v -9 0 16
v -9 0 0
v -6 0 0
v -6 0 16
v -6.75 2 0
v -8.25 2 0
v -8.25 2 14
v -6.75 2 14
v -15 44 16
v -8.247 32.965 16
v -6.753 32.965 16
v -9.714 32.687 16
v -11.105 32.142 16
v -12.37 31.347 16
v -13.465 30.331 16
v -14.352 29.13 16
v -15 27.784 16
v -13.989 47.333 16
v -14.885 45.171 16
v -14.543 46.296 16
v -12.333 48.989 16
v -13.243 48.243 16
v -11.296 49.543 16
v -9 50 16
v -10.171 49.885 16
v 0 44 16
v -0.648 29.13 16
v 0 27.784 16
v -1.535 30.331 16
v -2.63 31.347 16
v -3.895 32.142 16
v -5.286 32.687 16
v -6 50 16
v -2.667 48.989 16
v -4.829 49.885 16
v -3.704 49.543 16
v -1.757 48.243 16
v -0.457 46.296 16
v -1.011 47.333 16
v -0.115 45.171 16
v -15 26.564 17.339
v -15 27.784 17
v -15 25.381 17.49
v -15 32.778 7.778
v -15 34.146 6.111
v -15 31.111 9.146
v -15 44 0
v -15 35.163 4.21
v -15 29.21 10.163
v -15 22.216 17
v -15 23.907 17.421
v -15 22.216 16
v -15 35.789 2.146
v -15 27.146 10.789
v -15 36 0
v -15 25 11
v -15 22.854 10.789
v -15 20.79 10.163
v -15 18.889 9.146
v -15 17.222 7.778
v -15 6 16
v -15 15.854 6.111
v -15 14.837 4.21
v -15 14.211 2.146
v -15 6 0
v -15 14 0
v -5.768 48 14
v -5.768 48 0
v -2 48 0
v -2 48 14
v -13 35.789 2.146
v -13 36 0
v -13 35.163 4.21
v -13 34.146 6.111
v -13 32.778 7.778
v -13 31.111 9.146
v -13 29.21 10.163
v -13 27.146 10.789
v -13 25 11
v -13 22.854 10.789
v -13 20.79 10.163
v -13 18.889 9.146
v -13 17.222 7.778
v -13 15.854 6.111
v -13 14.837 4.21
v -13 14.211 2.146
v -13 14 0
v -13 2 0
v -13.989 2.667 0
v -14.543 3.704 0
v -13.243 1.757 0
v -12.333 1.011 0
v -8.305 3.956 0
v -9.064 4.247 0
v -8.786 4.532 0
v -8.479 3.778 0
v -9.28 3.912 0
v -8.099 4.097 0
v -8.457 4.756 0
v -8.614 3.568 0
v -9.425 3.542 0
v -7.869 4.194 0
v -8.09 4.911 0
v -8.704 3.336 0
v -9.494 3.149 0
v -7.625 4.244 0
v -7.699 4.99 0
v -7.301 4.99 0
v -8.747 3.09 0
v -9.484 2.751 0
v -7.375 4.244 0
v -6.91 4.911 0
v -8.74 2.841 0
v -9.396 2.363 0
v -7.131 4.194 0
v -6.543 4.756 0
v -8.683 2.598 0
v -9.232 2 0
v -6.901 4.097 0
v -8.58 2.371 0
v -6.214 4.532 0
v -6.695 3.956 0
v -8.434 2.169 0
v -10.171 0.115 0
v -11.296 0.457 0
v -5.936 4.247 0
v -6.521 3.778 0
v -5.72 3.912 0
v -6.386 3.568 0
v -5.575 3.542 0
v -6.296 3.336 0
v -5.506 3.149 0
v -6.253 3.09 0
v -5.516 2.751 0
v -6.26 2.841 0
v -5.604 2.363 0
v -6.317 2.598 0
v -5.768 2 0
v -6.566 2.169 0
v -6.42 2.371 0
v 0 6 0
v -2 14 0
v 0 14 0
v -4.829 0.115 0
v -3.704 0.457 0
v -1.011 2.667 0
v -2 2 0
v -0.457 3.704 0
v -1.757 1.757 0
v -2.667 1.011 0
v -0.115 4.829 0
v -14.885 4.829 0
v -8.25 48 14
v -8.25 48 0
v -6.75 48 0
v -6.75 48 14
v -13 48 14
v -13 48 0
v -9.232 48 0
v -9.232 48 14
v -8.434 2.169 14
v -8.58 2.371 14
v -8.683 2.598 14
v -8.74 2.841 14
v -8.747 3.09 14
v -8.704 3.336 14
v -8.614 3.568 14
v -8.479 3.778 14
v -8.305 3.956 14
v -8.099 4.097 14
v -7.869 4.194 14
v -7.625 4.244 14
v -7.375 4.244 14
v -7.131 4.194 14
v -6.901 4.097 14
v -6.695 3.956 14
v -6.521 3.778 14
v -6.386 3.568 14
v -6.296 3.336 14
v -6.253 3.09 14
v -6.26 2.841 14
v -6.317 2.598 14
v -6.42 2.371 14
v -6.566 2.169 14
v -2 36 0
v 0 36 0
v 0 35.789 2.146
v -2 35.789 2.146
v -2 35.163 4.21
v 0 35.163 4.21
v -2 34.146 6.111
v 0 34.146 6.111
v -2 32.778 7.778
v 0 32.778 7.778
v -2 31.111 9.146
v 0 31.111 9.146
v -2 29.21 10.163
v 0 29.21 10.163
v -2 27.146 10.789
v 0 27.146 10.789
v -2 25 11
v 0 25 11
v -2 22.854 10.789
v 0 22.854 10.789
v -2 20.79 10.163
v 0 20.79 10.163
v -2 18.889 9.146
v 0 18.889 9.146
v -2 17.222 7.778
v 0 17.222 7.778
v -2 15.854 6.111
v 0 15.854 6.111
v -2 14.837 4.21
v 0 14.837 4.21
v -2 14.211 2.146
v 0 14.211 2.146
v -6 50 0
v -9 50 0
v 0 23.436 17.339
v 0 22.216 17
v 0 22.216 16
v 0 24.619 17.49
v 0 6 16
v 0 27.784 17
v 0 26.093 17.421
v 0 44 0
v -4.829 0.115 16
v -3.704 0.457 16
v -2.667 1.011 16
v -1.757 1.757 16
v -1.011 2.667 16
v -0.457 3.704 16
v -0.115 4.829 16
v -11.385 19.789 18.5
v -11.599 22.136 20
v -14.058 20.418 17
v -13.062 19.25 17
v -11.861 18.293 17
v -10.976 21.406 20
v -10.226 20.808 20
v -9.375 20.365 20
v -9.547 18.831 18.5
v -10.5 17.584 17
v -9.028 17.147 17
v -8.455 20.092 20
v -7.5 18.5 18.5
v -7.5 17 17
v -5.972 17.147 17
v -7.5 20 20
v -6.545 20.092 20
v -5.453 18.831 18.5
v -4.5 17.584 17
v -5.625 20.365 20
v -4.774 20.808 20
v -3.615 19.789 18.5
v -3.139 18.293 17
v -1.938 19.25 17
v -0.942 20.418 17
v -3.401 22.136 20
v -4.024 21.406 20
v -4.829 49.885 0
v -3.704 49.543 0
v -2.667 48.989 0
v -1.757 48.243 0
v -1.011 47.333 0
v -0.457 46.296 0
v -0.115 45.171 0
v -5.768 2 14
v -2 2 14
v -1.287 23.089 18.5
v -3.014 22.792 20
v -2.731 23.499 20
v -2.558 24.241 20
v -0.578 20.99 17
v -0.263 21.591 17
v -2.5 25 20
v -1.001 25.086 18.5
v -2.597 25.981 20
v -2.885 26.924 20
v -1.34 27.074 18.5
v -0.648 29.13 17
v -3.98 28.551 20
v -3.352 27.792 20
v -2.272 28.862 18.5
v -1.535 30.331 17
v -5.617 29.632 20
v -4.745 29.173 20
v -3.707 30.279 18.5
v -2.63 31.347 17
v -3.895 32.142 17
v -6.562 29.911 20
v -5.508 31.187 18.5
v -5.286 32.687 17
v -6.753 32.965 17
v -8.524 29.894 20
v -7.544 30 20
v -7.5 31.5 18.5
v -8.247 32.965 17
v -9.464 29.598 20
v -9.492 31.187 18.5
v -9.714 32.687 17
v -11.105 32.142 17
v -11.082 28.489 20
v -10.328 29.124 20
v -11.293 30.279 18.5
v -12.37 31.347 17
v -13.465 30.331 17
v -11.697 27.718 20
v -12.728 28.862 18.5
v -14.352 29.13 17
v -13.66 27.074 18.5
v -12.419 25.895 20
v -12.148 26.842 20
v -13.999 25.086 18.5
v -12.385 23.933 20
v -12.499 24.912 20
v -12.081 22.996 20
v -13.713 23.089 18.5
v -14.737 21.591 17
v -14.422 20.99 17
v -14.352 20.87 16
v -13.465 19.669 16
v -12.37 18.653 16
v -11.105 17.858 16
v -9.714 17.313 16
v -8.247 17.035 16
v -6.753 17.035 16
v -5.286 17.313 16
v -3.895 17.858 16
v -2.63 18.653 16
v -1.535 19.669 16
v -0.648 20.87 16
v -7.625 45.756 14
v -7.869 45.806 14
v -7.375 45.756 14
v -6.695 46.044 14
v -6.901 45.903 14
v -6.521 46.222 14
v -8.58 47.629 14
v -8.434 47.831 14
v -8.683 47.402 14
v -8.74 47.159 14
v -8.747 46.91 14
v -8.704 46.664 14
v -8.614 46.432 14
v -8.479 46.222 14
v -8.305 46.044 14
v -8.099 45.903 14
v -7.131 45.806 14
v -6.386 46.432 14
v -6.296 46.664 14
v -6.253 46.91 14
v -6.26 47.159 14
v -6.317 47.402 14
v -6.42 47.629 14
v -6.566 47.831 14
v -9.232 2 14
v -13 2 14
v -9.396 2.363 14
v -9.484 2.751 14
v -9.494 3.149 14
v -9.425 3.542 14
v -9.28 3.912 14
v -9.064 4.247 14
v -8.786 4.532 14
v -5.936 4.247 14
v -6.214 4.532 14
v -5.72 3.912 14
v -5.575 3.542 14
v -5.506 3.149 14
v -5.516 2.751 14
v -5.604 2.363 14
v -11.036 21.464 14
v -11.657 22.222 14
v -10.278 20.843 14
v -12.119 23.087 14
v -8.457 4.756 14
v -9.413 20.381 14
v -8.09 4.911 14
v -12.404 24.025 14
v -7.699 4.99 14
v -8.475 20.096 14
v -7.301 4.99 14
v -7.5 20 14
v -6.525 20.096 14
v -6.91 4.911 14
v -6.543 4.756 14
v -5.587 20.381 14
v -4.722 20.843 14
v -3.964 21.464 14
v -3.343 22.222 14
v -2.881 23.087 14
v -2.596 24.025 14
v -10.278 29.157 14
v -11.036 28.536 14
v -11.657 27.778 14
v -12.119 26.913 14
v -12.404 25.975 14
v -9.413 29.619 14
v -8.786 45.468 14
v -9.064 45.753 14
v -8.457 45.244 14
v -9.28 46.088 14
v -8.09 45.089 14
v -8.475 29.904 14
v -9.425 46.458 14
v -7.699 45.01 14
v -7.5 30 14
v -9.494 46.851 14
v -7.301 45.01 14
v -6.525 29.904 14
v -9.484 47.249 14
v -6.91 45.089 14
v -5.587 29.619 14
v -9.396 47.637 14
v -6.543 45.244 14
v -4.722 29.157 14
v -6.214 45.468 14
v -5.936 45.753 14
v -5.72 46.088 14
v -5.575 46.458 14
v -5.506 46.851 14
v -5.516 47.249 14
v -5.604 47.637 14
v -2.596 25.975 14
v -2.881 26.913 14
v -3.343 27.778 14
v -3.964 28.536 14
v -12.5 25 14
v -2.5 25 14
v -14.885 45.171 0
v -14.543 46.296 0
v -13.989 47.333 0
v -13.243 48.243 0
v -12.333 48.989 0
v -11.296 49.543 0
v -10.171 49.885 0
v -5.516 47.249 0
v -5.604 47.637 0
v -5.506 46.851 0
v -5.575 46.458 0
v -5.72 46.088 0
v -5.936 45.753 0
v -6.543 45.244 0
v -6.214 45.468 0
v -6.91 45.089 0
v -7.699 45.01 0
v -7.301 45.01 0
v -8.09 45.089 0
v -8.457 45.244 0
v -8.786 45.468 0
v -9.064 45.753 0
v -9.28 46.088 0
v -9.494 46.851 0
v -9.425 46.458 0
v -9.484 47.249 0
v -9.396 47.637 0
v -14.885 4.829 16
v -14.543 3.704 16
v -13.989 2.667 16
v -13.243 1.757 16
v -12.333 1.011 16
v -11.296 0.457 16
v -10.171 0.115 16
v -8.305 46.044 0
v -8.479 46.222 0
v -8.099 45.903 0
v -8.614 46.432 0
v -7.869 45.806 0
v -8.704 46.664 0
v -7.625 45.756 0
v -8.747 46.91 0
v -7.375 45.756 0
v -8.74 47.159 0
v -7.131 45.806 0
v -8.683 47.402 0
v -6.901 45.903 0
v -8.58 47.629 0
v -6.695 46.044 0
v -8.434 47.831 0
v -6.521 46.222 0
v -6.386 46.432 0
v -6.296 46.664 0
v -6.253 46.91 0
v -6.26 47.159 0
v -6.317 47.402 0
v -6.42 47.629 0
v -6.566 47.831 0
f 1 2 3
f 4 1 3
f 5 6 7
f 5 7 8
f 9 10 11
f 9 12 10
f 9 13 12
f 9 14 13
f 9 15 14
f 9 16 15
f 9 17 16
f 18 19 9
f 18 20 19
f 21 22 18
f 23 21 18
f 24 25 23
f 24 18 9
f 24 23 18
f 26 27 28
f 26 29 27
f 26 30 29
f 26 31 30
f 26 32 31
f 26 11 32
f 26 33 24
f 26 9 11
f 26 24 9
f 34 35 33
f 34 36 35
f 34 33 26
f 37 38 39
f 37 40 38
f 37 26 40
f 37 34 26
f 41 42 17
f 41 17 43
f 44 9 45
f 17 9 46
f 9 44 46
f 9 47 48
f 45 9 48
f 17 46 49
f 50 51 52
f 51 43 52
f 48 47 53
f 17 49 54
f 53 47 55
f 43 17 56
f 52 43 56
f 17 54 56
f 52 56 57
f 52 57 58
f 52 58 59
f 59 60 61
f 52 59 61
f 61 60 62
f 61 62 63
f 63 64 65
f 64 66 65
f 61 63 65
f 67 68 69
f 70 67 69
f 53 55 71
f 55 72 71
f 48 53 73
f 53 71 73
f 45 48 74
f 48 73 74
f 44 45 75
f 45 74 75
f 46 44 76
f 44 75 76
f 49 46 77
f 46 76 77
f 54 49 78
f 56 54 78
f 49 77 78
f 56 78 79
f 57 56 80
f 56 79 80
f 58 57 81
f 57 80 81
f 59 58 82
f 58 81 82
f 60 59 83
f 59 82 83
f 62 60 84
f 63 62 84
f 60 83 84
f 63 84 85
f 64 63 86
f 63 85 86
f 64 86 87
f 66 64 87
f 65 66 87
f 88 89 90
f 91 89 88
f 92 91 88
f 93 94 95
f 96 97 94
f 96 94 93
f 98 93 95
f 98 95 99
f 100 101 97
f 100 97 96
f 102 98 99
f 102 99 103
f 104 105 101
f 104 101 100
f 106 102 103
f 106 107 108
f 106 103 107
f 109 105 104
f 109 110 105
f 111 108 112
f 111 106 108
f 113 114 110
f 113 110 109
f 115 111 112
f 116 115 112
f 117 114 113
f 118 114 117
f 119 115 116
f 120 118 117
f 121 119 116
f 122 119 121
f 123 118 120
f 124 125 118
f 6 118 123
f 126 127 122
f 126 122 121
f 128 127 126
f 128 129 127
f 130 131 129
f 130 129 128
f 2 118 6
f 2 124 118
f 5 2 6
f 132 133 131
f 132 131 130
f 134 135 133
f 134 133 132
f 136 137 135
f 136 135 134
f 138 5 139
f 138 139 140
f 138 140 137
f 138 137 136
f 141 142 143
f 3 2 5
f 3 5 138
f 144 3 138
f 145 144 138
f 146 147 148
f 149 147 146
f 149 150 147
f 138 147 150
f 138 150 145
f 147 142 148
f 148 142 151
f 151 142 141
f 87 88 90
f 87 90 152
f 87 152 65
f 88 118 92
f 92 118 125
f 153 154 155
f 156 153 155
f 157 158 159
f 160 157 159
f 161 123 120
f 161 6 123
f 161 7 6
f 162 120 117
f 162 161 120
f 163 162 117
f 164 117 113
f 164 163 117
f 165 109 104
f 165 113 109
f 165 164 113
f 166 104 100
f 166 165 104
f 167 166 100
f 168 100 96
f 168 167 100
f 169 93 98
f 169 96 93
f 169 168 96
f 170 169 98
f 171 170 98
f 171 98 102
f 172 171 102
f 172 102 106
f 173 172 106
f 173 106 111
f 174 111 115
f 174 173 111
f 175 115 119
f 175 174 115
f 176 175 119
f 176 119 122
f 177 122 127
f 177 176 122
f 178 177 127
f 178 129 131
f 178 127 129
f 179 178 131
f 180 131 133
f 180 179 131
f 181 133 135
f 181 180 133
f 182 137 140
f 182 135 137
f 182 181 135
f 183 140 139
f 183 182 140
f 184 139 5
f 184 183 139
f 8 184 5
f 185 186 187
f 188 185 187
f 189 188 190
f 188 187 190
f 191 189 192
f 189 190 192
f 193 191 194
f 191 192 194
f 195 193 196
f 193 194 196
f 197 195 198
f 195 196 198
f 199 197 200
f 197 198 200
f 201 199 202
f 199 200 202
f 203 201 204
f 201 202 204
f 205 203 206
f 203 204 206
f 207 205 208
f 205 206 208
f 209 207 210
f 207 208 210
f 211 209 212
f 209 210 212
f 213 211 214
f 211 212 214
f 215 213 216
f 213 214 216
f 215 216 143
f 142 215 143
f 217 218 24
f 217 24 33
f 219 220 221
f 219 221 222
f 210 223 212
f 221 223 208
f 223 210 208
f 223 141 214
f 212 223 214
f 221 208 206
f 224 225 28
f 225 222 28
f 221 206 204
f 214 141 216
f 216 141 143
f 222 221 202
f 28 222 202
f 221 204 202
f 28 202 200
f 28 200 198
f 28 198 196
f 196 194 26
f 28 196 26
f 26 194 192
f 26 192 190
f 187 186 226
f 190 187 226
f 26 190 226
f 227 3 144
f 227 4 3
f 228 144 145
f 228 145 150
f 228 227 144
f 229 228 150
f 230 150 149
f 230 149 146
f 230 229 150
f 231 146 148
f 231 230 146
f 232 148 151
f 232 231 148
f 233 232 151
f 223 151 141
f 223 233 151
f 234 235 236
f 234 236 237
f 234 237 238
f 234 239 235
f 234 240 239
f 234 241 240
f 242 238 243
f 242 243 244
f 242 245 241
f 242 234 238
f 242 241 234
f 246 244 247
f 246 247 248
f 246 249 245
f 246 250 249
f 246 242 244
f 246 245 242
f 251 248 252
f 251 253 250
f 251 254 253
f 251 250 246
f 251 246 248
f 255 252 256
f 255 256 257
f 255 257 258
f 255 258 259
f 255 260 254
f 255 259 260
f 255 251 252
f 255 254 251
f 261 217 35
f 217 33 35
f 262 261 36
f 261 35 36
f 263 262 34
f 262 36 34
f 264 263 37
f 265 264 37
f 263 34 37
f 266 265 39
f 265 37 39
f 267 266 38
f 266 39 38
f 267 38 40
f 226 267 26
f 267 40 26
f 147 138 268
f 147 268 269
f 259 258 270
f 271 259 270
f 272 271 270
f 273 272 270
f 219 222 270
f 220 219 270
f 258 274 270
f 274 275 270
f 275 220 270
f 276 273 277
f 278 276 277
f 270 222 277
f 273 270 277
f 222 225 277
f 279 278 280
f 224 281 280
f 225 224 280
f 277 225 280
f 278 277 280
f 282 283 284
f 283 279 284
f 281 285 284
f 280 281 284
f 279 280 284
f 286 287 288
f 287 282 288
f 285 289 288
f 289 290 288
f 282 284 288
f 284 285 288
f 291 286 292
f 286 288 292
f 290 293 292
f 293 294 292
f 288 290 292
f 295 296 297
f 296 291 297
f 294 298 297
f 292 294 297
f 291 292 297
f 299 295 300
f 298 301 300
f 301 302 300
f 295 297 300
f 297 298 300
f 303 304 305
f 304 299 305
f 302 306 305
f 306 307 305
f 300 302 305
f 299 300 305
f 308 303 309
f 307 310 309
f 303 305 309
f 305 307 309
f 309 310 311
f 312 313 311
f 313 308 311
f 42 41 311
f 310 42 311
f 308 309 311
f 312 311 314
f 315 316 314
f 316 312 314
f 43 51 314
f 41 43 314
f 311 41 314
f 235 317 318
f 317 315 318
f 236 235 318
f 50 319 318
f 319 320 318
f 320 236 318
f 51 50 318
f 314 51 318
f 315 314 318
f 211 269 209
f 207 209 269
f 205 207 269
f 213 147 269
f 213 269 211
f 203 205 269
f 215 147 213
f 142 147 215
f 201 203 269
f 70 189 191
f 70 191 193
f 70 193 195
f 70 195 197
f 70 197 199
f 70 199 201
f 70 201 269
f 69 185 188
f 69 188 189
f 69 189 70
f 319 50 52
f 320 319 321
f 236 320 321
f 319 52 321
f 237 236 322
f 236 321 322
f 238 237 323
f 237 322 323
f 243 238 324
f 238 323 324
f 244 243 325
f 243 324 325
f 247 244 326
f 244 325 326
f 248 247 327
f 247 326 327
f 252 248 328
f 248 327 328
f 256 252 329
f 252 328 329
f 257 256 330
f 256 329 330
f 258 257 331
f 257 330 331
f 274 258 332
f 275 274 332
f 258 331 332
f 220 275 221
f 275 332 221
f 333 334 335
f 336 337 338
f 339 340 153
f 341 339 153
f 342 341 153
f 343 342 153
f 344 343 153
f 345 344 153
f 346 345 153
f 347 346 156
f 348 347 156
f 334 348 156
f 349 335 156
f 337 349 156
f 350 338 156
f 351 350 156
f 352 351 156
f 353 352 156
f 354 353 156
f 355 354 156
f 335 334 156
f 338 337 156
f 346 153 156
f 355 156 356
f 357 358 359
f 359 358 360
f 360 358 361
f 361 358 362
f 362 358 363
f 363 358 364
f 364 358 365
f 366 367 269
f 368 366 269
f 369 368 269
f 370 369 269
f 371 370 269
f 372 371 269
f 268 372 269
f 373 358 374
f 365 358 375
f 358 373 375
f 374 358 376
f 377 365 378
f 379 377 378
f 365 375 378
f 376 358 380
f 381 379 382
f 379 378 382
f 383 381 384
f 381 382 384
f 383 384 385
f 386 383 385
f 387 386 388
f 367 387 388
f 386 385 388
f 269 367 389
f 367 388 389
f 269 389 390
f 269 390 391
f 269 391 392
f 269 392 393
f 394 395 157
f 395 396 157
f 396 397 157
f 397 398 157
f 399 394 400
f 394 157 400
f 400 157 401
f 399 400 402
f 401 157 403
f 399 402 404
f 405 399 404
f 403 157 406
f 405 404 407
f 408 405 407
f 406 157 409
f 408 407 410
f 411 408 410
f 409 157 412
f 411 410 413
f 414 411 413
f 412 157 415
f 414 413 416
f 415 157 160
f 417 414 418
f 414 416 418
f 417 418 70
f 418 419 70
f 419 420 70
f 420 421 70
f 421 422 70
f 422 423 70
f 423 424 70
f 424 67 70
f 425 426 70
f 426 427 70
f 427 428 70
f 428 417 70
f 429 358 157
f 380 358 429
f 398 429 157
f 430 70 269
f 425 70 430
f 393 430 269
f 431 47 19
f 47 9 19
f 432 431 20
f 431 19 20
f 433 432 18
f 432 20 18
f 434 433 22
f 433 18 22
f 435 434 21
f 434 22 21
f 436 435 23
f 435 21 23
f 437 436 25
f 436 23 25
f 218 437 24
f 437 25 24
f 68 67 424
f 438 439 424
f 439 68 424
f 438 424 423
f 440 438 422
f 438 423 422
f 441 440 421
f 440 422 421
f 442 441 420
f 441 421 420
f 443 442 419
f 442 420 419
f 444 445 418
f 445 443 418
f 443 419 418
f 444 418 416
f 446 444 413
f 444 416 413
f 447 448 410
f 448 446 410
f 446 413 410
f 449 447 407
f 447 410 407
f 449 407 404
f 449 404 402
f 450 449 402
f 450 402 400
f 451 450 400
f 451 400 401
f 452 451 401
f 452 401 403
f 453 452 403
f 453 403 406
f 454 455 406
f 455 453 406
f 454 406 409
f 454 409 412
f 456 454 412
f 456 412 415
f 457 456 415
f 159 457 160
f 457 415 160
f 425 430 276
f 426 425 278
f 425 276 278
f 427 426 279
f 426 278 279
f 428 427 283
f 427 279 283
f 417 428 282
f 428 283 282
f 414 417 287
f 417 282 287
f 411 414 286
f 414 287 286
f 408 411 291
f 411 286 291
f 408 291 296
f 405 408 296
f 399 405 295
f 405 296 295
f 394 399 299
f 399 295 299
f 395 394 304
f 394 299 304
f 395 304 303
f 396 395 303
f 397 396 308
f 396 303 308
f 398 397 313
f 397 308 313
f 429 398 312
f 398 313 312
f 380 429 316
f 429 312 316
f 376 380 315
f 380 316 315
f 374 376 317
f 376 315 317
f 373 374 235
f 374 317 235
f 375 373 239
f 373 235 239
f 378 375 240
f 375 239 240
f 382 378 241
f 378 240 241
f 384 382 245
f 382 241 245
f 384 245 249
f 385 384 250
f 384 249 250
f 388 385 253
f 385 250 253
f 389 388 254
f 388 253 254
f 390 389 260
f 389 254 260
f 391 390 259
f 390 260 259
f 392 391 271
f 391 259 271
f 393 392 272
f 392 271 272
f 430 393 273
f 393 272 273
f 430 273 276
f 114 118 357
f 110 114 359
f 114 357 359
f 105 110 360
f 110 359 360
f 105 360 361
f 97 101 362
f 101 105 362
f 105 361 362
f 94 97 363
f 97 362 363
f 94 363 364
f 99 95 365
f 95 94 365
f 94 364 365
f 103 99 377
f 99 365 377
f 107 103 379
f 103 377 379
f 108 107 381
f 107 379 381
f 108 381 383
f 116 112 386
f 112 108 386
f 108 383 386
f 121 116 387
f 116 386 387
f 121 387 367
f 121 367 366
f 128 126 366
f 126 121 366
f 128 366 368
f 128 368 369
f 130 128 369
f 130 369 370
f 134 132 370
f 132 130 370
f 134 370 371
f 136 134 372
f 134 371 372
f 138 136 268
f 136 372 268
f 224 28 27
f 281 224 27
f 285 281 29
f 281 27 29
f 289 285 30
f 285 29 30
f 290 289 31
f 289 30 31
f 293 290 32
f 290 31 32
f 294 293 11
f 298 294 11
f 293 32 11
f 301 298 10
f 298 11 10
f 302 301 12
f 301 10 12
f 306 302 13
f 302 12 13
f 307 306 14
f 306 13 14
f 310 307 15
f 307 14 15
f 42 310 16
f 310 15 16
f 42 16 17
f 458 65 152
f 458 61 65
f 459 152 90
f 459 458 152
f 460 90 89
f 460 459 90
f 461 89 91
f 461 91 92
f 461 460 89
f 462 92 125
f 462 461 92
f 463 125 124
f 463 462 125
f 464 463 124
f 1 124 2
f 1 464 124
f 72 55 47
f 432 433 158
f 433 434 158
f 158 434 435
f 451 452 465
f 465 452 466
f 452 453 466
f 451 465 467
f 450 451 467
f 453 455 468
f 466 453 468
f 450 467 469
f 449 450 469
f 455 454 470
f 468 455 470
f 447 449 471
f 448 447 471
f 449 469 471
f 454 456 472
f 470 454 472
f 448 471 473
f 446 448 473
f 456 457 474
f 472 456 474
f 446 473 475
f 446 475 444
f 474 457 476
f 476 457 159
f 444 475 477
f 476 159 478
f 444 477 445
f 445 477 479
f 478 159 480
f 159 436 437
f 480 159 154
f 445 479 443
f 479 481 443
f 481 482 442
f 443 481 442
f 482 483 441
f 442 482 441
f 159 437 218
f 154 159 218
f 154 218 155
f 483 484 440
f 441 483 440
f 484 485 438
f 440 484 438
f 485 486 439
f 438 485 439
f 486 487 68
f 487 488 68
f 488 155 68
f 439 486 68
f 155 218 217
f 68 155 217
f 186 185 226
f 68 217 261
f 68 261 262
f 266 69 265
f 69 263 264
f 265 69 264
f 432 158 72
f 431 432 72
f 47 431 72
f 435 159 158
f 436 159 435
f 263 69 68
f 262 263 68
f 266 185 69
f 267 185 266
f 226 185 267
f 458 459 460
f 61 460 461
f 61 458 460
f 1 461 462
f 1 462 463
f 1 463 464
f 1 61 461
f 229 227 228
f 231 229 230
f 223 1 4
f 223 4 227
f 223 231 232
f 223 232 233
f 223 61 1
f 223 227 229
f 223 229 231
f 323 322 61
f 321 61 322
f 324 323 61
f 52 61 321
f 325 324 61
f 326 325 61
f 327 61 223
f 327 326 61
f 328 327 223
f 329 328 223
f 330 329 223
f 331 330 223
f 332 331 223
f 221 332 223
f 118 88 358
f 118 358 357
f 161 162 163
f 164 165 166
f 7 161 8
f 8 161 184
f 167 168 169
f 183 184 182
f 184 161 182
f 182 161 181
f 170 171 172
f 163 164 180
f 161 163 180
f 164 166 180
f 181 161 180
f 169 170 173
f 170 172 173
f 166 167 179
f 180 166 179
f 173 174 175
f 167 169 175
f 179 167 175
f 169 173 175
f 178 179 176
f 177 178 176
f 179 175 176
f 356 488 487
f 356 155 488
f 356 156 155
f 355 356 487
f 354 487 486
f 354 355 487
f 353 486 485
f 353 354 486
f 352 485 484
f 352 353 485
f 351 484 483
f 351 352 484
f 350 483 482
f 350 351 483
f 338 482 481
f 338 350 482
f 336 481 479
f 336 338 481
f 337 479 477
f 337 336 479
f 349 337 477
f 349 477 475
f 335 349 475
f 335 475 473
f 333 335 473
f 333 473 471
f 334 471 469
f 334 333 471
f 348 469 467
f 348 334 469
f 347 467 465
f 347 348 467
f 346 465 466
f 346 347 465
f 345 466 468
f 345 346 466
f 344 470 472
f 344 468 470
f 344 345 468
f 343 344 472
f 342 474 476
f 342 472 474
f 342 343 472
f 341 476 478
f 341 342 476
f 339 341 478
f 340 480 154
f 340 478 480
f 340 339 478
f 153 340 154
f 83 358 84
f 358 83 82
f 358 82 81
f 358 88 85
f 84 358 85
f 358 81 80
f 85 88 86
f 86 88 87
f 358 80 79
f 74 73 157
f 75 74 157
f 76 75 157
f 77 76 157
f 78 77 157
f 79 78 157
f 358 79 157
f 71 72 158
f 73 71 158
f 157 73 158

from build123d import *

# Parameters (mm, degrees)
F0_W         = 15
F0_H         = 50
F1_DEPTH     = 16
F3_DEPTH     = 25
F4_T         = -2
F5_R         = 6
F6_R         = 5
F7_DEPTH     = 25
F9_DEPTH     = 4
F10_R        = 5
F11_DEPTH    = 25
F12_T2_ANGLE = 249.8880129875
F12_T4_ANGLE = 220.6883825687
F13_R        = 2
F13_R_2      = 1.25
F14_DEPTH    = 14


# Not quite as in the source:
# - a fillet or chamfer that OpenCascade refuses, or shapes differently, is made with other operations: its cross-section is extruded or revolved along the edge and cut away or added


with BuildPart() as f1:
    # F0 (on Top) → F1 (new body)
    with BuildSketch(Plane.XY):
        with Locations((-7.5, 25)):
            Rectangle(F0_W, F0_H)
    extrude(amount=F1_DEPTH)

    # F2 (on face) → F3 (cut)
    with BuildSketch(Plane.YZ):
        with BuildLine():
            Line((14, 0), (36, 0))
            ThreePointArc((36, 0), (25, 11), (14, 0))
        make_face()
    extrude(amount=-F3_DEPTH, mode=Mode.SUBTRACT)

    # F4
    f4_openings = [f1.faces().sort_by_distance(p)[0] for p in [
        (-7.5, 25, 11),
        (-7.5, 7, 0),
        (-7.5, 43, 0),
    ]]
    offset(amount=F4_T, openings=f4_openings)

    # F5
    f5_edges = [f1.edges().sort_by_distance(p)[0] for p in [
        (0, 0, 8),
        (0, 50, 8),
        (-15, 50, 8),
        (-15, 0, 8),
    ]]
    fillet(f5_edges, radius=F5_R)

    # F6 (on face) → F7 (cut)
    with BuildSketch(Plane.XY.offset(16)):
        with Locations((-7.5, 25)):
            Circle(F6_R)
    extrude(amount=-F7_DEPTH, mode=Mode.SUBTRACT)

    # F8 (on face) → F9 (join)
    with BuildSketch(Plane.XY.offset(16)):
        with BuildLine():
            ThreePointArc((0, 27.7838821814), (-7.5, 33), (-15, 27.7838821814))
            Line((-15, 27.7838821814), (-15, 22.2161178186))
            ThreePointArc((-15, 22.2161178186), (-7.5, 17), (0, 22.2161178186))
            Line((0, 22.2161178186), (0, 27.7838821814))
        make_face()
    extrude(amount=F9_DEPTH)

    # F10 (on face) → F11 (cut)
    with BuildSketch(Plane.XY.offset(20)):
        with Locations((-7.5, 25)):
            Circle(F10_R)
    extrude(amount=-F11_DEPTH, mode=Mode.SUBTRACT)

    # F12: chamfer of 3 on 4 edges, made by hand

    # F12_s1 → F12_t2 (revolve, cut)
    with BuildSketch(Plane(origin=(9.2772397602, 13.2768682197, 0), x_dir=(0, 0, 1), z_dir=(-0.572775629, -0.8197121927, 0))):
        Polygon((20, 15.4672321702), (17, 12.4672321702), (20, 12.4672321702), align=None)
    revolve(axis=Axis((-7.5, 25, 20), (0, 0, 1)), revolution_arc=F12_T2_ANGLE, mode=Mode.SUBTRACT)

    # F12_s3 → F12_t4 (revolve, cut)
    with BuildSketch(Plane(origin=(7.2428078971, 19.5335392611, 0), x_dir=(0, 0, 1), z_dir=(0.3476589265, 0.93762107, 0))):
        Polygon((17, -23.7236311869), (20, -20.7236311869), (20, -23.7236311869), align=None)
    revolve(axis=Axis((-7.5, 25, 20), (0, 0, 1)), revolution_arc=F12_T4_ANGLE, mode=Mode.SUBTRACT)

    # F13 (on face) → F14 (join)
    with BuildSketch(Plane(origin=(0, 0, 14), x_dir=(1, 0, 0), z_dir=(0, 0, -1))):
        with Locations((-7.5, -3)):
            Circle(F13_R)
        with Locations((-7.5, -3)):
            Circle(F13_R_2, mode=Mode.SUBTRACT)
        with Locations((-7.5, -47)):
            Circle(F13_R)
        with Locations((-7.5, -47)):
            Circle(F13_R_2, mode=Mode.SUBTRACT)
    extrude(amount=F14_DEPTH)


solid = f1.part
